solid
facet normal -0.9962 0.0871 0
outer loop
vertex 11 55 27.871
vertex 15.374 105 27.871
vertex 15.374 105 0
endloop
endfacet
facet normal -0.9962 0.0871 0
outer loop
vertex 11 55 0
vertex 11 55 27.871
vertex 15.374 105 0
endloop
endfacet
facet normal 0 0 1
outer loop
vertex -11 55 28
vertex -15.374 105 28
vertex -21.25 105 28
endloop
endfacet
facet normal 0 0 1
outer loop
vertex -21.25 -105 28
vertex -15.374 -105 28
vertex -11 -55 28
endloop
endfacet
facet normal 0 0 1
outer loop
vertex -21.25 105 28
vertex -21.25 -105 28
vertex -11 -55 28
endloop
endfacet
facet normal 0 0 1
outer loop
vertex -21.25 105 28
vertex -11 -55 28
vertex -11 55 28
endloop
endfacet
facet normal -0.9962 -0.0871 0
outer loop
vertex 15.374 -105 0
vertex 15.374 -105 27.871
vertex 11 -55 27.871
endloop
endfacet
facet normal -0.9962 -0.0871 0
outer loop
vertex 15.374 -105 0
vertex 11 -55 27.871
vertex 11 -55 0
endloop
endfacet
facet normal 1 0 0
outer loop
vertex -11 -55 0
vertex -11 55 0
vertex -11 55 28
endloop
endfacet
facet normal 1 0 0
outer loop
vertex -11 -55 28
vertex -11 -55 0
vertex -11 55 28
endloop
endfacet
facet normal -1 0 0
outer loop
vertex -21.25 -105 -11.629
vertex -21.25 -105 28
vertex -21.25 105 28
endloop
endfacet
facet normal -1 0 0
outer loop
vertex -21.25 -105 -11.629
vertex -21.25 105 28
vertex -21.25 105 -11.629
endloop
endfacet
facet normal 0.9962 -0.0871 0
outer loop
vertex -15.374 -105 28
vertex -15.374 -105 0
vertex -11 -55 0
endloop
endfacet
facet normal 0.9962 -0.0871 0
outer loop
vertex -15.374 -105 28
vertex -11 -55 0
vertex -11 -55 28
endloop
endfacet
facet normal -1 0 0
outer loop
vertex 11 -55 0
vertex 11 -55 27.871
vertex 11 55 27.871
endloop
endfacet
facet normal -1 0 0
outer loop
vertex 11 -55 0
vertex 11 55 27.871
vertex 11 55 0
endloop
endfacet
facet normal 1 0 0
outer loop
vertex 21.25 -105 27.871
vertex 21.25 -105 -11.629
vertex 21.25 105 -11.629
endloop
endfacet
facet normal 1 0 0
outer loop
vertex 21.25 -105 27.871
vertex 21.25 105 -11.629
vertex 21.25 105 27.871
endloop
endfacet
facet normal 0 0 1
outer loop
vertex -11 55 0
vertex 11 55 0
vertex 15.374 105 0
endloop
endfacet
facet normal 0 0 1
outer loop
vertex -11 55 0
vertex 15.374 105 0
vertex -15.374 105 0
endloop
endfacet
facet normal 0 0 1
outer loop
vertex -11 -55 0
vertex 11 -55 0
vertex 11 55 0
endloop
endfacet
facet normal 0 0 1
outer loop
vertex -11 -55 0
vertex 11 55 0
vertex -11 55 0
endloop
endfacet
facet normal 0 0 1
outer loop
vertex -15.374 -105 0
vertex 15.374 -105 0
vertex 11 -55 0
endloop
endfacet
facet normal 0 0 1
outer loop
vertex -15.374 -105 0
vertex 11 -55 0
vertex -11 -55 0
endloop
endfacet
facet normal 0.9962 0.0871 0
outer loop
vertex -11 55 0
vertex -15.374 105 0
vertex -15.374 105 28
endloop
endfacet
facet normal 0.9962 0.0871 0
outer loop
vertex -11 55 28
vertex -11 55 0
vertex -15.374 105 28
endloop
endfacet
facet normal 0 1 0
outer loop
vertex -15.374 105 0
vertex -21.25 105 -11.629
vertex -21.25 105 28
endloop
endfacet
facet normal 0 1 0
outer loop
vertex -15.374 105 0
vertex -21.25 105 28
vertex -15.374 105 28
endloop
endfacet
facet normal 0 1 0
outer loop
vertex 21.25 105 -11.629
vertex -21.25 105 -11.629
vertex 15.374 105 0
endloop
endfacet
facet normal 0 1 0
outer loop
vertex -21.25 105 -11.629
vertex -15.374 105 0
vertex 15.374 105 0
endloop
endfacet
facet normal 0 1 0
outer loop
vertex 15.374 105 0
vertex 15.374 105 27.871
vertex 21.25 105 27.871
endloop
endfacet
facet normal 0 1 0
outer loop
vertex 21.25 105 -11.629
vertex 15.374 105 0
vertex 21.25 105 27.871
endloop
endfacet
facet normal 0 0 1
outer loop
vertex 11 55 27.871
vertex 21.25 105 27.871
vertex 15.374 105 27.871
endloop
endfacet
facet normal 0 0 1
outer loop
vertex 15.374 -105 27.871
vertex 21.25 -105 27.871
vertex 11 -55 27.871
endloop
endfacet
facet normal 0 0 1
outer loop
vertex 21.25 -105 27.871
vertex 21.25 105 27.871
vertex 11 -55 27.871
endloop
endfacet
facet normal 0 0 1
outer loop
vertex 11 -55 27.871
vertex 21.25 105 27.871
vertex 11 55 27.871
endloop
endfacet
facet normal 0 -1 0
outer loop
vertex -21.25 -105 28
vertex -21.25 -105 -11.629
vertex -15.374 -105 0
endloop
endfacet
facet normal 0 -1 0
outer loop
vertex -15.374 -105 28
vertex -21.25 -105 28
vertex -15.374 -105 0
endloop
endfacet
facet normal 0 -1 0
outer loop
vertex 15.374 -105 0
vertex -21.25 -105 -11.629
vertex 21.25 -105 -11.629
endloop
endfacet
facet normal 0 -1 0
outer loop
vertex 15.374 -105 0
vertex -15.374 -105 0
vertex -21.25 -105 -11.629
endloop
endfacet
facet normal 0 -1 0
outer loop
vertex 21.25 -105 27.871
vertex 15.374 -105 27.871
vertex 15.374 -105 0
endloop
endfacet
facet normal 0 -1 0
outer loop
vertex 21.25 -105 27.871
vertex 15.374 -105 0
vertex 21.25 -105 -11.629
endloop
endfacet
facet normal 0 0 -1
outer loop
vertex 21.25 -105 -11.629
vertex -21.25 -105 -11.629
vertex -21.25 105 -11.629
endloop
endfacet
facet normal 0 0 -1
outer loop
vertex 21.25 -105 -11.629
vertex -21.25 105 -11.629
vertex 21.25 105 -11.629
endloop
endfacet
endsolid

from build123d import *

# Parameters (mm, degrees)
F1_DEPTH   = 105
F2_SIZE2   = 4.3744331763
F2_SIZE    = 50
F2_2_SIZE2 = 4.3744331763
F2_2_SIZE  = 50
F3_SIZE2   = 4.3744331763
F3_SIZE    = 50


with BuildPart() as f1:
    # F0 (on Front) → F1 (new body, symmetric)
    with BuildSketch(Plane.XZ):
        Polygon((-11, 28), (-21.25, 28), (-21.25, -11.6291716302), (21.25, -11.6291716302), (21.25, 27.8708283698), (11, 27.8708283698), (11, 0), (-11, 0), align=None)
    extrude(amount=F1_DEPTH, both=True)

    # F2
    f2_edges = [f1.edges().sort_by_distance(p)[0] for p in [
        (-11, -105, 14),
        (-11, 105, 14),
    ]]
    f2_side = f1.faces().sort_by_distance((-11, 0, 14))[0]
    chamfer(f2_edges, length=F2_SIZE, length2=F2_SIZE2, reference=f2_side)

    # F2#2
    f2_2_edges = [f1.edges().sort_by_distance(p)[0] for p in [
        (11, -105, 13.935414),
    ]]
    f2_2_side = f1.faces().sort_by_distance((11, 0, 13.935414))[0]
    chamfer(f2_2_edges, length=F2_2_SIZE, length2=F2_2_SIZE2, reference=f2_2_side)

    # F3
    f3_edges = [f1.edges().sort_by_distance(p)[0] for p in [
        (11, 105, 13.935414),
    ]]
    f3_side = f1.faces().sort_by_distance((11, 25, 13.935414))[0]
    chamfer(f3_edges, length=F3_SIZE, length2=F3_SIZE2, reference=f3_side)


solid = f1.part
